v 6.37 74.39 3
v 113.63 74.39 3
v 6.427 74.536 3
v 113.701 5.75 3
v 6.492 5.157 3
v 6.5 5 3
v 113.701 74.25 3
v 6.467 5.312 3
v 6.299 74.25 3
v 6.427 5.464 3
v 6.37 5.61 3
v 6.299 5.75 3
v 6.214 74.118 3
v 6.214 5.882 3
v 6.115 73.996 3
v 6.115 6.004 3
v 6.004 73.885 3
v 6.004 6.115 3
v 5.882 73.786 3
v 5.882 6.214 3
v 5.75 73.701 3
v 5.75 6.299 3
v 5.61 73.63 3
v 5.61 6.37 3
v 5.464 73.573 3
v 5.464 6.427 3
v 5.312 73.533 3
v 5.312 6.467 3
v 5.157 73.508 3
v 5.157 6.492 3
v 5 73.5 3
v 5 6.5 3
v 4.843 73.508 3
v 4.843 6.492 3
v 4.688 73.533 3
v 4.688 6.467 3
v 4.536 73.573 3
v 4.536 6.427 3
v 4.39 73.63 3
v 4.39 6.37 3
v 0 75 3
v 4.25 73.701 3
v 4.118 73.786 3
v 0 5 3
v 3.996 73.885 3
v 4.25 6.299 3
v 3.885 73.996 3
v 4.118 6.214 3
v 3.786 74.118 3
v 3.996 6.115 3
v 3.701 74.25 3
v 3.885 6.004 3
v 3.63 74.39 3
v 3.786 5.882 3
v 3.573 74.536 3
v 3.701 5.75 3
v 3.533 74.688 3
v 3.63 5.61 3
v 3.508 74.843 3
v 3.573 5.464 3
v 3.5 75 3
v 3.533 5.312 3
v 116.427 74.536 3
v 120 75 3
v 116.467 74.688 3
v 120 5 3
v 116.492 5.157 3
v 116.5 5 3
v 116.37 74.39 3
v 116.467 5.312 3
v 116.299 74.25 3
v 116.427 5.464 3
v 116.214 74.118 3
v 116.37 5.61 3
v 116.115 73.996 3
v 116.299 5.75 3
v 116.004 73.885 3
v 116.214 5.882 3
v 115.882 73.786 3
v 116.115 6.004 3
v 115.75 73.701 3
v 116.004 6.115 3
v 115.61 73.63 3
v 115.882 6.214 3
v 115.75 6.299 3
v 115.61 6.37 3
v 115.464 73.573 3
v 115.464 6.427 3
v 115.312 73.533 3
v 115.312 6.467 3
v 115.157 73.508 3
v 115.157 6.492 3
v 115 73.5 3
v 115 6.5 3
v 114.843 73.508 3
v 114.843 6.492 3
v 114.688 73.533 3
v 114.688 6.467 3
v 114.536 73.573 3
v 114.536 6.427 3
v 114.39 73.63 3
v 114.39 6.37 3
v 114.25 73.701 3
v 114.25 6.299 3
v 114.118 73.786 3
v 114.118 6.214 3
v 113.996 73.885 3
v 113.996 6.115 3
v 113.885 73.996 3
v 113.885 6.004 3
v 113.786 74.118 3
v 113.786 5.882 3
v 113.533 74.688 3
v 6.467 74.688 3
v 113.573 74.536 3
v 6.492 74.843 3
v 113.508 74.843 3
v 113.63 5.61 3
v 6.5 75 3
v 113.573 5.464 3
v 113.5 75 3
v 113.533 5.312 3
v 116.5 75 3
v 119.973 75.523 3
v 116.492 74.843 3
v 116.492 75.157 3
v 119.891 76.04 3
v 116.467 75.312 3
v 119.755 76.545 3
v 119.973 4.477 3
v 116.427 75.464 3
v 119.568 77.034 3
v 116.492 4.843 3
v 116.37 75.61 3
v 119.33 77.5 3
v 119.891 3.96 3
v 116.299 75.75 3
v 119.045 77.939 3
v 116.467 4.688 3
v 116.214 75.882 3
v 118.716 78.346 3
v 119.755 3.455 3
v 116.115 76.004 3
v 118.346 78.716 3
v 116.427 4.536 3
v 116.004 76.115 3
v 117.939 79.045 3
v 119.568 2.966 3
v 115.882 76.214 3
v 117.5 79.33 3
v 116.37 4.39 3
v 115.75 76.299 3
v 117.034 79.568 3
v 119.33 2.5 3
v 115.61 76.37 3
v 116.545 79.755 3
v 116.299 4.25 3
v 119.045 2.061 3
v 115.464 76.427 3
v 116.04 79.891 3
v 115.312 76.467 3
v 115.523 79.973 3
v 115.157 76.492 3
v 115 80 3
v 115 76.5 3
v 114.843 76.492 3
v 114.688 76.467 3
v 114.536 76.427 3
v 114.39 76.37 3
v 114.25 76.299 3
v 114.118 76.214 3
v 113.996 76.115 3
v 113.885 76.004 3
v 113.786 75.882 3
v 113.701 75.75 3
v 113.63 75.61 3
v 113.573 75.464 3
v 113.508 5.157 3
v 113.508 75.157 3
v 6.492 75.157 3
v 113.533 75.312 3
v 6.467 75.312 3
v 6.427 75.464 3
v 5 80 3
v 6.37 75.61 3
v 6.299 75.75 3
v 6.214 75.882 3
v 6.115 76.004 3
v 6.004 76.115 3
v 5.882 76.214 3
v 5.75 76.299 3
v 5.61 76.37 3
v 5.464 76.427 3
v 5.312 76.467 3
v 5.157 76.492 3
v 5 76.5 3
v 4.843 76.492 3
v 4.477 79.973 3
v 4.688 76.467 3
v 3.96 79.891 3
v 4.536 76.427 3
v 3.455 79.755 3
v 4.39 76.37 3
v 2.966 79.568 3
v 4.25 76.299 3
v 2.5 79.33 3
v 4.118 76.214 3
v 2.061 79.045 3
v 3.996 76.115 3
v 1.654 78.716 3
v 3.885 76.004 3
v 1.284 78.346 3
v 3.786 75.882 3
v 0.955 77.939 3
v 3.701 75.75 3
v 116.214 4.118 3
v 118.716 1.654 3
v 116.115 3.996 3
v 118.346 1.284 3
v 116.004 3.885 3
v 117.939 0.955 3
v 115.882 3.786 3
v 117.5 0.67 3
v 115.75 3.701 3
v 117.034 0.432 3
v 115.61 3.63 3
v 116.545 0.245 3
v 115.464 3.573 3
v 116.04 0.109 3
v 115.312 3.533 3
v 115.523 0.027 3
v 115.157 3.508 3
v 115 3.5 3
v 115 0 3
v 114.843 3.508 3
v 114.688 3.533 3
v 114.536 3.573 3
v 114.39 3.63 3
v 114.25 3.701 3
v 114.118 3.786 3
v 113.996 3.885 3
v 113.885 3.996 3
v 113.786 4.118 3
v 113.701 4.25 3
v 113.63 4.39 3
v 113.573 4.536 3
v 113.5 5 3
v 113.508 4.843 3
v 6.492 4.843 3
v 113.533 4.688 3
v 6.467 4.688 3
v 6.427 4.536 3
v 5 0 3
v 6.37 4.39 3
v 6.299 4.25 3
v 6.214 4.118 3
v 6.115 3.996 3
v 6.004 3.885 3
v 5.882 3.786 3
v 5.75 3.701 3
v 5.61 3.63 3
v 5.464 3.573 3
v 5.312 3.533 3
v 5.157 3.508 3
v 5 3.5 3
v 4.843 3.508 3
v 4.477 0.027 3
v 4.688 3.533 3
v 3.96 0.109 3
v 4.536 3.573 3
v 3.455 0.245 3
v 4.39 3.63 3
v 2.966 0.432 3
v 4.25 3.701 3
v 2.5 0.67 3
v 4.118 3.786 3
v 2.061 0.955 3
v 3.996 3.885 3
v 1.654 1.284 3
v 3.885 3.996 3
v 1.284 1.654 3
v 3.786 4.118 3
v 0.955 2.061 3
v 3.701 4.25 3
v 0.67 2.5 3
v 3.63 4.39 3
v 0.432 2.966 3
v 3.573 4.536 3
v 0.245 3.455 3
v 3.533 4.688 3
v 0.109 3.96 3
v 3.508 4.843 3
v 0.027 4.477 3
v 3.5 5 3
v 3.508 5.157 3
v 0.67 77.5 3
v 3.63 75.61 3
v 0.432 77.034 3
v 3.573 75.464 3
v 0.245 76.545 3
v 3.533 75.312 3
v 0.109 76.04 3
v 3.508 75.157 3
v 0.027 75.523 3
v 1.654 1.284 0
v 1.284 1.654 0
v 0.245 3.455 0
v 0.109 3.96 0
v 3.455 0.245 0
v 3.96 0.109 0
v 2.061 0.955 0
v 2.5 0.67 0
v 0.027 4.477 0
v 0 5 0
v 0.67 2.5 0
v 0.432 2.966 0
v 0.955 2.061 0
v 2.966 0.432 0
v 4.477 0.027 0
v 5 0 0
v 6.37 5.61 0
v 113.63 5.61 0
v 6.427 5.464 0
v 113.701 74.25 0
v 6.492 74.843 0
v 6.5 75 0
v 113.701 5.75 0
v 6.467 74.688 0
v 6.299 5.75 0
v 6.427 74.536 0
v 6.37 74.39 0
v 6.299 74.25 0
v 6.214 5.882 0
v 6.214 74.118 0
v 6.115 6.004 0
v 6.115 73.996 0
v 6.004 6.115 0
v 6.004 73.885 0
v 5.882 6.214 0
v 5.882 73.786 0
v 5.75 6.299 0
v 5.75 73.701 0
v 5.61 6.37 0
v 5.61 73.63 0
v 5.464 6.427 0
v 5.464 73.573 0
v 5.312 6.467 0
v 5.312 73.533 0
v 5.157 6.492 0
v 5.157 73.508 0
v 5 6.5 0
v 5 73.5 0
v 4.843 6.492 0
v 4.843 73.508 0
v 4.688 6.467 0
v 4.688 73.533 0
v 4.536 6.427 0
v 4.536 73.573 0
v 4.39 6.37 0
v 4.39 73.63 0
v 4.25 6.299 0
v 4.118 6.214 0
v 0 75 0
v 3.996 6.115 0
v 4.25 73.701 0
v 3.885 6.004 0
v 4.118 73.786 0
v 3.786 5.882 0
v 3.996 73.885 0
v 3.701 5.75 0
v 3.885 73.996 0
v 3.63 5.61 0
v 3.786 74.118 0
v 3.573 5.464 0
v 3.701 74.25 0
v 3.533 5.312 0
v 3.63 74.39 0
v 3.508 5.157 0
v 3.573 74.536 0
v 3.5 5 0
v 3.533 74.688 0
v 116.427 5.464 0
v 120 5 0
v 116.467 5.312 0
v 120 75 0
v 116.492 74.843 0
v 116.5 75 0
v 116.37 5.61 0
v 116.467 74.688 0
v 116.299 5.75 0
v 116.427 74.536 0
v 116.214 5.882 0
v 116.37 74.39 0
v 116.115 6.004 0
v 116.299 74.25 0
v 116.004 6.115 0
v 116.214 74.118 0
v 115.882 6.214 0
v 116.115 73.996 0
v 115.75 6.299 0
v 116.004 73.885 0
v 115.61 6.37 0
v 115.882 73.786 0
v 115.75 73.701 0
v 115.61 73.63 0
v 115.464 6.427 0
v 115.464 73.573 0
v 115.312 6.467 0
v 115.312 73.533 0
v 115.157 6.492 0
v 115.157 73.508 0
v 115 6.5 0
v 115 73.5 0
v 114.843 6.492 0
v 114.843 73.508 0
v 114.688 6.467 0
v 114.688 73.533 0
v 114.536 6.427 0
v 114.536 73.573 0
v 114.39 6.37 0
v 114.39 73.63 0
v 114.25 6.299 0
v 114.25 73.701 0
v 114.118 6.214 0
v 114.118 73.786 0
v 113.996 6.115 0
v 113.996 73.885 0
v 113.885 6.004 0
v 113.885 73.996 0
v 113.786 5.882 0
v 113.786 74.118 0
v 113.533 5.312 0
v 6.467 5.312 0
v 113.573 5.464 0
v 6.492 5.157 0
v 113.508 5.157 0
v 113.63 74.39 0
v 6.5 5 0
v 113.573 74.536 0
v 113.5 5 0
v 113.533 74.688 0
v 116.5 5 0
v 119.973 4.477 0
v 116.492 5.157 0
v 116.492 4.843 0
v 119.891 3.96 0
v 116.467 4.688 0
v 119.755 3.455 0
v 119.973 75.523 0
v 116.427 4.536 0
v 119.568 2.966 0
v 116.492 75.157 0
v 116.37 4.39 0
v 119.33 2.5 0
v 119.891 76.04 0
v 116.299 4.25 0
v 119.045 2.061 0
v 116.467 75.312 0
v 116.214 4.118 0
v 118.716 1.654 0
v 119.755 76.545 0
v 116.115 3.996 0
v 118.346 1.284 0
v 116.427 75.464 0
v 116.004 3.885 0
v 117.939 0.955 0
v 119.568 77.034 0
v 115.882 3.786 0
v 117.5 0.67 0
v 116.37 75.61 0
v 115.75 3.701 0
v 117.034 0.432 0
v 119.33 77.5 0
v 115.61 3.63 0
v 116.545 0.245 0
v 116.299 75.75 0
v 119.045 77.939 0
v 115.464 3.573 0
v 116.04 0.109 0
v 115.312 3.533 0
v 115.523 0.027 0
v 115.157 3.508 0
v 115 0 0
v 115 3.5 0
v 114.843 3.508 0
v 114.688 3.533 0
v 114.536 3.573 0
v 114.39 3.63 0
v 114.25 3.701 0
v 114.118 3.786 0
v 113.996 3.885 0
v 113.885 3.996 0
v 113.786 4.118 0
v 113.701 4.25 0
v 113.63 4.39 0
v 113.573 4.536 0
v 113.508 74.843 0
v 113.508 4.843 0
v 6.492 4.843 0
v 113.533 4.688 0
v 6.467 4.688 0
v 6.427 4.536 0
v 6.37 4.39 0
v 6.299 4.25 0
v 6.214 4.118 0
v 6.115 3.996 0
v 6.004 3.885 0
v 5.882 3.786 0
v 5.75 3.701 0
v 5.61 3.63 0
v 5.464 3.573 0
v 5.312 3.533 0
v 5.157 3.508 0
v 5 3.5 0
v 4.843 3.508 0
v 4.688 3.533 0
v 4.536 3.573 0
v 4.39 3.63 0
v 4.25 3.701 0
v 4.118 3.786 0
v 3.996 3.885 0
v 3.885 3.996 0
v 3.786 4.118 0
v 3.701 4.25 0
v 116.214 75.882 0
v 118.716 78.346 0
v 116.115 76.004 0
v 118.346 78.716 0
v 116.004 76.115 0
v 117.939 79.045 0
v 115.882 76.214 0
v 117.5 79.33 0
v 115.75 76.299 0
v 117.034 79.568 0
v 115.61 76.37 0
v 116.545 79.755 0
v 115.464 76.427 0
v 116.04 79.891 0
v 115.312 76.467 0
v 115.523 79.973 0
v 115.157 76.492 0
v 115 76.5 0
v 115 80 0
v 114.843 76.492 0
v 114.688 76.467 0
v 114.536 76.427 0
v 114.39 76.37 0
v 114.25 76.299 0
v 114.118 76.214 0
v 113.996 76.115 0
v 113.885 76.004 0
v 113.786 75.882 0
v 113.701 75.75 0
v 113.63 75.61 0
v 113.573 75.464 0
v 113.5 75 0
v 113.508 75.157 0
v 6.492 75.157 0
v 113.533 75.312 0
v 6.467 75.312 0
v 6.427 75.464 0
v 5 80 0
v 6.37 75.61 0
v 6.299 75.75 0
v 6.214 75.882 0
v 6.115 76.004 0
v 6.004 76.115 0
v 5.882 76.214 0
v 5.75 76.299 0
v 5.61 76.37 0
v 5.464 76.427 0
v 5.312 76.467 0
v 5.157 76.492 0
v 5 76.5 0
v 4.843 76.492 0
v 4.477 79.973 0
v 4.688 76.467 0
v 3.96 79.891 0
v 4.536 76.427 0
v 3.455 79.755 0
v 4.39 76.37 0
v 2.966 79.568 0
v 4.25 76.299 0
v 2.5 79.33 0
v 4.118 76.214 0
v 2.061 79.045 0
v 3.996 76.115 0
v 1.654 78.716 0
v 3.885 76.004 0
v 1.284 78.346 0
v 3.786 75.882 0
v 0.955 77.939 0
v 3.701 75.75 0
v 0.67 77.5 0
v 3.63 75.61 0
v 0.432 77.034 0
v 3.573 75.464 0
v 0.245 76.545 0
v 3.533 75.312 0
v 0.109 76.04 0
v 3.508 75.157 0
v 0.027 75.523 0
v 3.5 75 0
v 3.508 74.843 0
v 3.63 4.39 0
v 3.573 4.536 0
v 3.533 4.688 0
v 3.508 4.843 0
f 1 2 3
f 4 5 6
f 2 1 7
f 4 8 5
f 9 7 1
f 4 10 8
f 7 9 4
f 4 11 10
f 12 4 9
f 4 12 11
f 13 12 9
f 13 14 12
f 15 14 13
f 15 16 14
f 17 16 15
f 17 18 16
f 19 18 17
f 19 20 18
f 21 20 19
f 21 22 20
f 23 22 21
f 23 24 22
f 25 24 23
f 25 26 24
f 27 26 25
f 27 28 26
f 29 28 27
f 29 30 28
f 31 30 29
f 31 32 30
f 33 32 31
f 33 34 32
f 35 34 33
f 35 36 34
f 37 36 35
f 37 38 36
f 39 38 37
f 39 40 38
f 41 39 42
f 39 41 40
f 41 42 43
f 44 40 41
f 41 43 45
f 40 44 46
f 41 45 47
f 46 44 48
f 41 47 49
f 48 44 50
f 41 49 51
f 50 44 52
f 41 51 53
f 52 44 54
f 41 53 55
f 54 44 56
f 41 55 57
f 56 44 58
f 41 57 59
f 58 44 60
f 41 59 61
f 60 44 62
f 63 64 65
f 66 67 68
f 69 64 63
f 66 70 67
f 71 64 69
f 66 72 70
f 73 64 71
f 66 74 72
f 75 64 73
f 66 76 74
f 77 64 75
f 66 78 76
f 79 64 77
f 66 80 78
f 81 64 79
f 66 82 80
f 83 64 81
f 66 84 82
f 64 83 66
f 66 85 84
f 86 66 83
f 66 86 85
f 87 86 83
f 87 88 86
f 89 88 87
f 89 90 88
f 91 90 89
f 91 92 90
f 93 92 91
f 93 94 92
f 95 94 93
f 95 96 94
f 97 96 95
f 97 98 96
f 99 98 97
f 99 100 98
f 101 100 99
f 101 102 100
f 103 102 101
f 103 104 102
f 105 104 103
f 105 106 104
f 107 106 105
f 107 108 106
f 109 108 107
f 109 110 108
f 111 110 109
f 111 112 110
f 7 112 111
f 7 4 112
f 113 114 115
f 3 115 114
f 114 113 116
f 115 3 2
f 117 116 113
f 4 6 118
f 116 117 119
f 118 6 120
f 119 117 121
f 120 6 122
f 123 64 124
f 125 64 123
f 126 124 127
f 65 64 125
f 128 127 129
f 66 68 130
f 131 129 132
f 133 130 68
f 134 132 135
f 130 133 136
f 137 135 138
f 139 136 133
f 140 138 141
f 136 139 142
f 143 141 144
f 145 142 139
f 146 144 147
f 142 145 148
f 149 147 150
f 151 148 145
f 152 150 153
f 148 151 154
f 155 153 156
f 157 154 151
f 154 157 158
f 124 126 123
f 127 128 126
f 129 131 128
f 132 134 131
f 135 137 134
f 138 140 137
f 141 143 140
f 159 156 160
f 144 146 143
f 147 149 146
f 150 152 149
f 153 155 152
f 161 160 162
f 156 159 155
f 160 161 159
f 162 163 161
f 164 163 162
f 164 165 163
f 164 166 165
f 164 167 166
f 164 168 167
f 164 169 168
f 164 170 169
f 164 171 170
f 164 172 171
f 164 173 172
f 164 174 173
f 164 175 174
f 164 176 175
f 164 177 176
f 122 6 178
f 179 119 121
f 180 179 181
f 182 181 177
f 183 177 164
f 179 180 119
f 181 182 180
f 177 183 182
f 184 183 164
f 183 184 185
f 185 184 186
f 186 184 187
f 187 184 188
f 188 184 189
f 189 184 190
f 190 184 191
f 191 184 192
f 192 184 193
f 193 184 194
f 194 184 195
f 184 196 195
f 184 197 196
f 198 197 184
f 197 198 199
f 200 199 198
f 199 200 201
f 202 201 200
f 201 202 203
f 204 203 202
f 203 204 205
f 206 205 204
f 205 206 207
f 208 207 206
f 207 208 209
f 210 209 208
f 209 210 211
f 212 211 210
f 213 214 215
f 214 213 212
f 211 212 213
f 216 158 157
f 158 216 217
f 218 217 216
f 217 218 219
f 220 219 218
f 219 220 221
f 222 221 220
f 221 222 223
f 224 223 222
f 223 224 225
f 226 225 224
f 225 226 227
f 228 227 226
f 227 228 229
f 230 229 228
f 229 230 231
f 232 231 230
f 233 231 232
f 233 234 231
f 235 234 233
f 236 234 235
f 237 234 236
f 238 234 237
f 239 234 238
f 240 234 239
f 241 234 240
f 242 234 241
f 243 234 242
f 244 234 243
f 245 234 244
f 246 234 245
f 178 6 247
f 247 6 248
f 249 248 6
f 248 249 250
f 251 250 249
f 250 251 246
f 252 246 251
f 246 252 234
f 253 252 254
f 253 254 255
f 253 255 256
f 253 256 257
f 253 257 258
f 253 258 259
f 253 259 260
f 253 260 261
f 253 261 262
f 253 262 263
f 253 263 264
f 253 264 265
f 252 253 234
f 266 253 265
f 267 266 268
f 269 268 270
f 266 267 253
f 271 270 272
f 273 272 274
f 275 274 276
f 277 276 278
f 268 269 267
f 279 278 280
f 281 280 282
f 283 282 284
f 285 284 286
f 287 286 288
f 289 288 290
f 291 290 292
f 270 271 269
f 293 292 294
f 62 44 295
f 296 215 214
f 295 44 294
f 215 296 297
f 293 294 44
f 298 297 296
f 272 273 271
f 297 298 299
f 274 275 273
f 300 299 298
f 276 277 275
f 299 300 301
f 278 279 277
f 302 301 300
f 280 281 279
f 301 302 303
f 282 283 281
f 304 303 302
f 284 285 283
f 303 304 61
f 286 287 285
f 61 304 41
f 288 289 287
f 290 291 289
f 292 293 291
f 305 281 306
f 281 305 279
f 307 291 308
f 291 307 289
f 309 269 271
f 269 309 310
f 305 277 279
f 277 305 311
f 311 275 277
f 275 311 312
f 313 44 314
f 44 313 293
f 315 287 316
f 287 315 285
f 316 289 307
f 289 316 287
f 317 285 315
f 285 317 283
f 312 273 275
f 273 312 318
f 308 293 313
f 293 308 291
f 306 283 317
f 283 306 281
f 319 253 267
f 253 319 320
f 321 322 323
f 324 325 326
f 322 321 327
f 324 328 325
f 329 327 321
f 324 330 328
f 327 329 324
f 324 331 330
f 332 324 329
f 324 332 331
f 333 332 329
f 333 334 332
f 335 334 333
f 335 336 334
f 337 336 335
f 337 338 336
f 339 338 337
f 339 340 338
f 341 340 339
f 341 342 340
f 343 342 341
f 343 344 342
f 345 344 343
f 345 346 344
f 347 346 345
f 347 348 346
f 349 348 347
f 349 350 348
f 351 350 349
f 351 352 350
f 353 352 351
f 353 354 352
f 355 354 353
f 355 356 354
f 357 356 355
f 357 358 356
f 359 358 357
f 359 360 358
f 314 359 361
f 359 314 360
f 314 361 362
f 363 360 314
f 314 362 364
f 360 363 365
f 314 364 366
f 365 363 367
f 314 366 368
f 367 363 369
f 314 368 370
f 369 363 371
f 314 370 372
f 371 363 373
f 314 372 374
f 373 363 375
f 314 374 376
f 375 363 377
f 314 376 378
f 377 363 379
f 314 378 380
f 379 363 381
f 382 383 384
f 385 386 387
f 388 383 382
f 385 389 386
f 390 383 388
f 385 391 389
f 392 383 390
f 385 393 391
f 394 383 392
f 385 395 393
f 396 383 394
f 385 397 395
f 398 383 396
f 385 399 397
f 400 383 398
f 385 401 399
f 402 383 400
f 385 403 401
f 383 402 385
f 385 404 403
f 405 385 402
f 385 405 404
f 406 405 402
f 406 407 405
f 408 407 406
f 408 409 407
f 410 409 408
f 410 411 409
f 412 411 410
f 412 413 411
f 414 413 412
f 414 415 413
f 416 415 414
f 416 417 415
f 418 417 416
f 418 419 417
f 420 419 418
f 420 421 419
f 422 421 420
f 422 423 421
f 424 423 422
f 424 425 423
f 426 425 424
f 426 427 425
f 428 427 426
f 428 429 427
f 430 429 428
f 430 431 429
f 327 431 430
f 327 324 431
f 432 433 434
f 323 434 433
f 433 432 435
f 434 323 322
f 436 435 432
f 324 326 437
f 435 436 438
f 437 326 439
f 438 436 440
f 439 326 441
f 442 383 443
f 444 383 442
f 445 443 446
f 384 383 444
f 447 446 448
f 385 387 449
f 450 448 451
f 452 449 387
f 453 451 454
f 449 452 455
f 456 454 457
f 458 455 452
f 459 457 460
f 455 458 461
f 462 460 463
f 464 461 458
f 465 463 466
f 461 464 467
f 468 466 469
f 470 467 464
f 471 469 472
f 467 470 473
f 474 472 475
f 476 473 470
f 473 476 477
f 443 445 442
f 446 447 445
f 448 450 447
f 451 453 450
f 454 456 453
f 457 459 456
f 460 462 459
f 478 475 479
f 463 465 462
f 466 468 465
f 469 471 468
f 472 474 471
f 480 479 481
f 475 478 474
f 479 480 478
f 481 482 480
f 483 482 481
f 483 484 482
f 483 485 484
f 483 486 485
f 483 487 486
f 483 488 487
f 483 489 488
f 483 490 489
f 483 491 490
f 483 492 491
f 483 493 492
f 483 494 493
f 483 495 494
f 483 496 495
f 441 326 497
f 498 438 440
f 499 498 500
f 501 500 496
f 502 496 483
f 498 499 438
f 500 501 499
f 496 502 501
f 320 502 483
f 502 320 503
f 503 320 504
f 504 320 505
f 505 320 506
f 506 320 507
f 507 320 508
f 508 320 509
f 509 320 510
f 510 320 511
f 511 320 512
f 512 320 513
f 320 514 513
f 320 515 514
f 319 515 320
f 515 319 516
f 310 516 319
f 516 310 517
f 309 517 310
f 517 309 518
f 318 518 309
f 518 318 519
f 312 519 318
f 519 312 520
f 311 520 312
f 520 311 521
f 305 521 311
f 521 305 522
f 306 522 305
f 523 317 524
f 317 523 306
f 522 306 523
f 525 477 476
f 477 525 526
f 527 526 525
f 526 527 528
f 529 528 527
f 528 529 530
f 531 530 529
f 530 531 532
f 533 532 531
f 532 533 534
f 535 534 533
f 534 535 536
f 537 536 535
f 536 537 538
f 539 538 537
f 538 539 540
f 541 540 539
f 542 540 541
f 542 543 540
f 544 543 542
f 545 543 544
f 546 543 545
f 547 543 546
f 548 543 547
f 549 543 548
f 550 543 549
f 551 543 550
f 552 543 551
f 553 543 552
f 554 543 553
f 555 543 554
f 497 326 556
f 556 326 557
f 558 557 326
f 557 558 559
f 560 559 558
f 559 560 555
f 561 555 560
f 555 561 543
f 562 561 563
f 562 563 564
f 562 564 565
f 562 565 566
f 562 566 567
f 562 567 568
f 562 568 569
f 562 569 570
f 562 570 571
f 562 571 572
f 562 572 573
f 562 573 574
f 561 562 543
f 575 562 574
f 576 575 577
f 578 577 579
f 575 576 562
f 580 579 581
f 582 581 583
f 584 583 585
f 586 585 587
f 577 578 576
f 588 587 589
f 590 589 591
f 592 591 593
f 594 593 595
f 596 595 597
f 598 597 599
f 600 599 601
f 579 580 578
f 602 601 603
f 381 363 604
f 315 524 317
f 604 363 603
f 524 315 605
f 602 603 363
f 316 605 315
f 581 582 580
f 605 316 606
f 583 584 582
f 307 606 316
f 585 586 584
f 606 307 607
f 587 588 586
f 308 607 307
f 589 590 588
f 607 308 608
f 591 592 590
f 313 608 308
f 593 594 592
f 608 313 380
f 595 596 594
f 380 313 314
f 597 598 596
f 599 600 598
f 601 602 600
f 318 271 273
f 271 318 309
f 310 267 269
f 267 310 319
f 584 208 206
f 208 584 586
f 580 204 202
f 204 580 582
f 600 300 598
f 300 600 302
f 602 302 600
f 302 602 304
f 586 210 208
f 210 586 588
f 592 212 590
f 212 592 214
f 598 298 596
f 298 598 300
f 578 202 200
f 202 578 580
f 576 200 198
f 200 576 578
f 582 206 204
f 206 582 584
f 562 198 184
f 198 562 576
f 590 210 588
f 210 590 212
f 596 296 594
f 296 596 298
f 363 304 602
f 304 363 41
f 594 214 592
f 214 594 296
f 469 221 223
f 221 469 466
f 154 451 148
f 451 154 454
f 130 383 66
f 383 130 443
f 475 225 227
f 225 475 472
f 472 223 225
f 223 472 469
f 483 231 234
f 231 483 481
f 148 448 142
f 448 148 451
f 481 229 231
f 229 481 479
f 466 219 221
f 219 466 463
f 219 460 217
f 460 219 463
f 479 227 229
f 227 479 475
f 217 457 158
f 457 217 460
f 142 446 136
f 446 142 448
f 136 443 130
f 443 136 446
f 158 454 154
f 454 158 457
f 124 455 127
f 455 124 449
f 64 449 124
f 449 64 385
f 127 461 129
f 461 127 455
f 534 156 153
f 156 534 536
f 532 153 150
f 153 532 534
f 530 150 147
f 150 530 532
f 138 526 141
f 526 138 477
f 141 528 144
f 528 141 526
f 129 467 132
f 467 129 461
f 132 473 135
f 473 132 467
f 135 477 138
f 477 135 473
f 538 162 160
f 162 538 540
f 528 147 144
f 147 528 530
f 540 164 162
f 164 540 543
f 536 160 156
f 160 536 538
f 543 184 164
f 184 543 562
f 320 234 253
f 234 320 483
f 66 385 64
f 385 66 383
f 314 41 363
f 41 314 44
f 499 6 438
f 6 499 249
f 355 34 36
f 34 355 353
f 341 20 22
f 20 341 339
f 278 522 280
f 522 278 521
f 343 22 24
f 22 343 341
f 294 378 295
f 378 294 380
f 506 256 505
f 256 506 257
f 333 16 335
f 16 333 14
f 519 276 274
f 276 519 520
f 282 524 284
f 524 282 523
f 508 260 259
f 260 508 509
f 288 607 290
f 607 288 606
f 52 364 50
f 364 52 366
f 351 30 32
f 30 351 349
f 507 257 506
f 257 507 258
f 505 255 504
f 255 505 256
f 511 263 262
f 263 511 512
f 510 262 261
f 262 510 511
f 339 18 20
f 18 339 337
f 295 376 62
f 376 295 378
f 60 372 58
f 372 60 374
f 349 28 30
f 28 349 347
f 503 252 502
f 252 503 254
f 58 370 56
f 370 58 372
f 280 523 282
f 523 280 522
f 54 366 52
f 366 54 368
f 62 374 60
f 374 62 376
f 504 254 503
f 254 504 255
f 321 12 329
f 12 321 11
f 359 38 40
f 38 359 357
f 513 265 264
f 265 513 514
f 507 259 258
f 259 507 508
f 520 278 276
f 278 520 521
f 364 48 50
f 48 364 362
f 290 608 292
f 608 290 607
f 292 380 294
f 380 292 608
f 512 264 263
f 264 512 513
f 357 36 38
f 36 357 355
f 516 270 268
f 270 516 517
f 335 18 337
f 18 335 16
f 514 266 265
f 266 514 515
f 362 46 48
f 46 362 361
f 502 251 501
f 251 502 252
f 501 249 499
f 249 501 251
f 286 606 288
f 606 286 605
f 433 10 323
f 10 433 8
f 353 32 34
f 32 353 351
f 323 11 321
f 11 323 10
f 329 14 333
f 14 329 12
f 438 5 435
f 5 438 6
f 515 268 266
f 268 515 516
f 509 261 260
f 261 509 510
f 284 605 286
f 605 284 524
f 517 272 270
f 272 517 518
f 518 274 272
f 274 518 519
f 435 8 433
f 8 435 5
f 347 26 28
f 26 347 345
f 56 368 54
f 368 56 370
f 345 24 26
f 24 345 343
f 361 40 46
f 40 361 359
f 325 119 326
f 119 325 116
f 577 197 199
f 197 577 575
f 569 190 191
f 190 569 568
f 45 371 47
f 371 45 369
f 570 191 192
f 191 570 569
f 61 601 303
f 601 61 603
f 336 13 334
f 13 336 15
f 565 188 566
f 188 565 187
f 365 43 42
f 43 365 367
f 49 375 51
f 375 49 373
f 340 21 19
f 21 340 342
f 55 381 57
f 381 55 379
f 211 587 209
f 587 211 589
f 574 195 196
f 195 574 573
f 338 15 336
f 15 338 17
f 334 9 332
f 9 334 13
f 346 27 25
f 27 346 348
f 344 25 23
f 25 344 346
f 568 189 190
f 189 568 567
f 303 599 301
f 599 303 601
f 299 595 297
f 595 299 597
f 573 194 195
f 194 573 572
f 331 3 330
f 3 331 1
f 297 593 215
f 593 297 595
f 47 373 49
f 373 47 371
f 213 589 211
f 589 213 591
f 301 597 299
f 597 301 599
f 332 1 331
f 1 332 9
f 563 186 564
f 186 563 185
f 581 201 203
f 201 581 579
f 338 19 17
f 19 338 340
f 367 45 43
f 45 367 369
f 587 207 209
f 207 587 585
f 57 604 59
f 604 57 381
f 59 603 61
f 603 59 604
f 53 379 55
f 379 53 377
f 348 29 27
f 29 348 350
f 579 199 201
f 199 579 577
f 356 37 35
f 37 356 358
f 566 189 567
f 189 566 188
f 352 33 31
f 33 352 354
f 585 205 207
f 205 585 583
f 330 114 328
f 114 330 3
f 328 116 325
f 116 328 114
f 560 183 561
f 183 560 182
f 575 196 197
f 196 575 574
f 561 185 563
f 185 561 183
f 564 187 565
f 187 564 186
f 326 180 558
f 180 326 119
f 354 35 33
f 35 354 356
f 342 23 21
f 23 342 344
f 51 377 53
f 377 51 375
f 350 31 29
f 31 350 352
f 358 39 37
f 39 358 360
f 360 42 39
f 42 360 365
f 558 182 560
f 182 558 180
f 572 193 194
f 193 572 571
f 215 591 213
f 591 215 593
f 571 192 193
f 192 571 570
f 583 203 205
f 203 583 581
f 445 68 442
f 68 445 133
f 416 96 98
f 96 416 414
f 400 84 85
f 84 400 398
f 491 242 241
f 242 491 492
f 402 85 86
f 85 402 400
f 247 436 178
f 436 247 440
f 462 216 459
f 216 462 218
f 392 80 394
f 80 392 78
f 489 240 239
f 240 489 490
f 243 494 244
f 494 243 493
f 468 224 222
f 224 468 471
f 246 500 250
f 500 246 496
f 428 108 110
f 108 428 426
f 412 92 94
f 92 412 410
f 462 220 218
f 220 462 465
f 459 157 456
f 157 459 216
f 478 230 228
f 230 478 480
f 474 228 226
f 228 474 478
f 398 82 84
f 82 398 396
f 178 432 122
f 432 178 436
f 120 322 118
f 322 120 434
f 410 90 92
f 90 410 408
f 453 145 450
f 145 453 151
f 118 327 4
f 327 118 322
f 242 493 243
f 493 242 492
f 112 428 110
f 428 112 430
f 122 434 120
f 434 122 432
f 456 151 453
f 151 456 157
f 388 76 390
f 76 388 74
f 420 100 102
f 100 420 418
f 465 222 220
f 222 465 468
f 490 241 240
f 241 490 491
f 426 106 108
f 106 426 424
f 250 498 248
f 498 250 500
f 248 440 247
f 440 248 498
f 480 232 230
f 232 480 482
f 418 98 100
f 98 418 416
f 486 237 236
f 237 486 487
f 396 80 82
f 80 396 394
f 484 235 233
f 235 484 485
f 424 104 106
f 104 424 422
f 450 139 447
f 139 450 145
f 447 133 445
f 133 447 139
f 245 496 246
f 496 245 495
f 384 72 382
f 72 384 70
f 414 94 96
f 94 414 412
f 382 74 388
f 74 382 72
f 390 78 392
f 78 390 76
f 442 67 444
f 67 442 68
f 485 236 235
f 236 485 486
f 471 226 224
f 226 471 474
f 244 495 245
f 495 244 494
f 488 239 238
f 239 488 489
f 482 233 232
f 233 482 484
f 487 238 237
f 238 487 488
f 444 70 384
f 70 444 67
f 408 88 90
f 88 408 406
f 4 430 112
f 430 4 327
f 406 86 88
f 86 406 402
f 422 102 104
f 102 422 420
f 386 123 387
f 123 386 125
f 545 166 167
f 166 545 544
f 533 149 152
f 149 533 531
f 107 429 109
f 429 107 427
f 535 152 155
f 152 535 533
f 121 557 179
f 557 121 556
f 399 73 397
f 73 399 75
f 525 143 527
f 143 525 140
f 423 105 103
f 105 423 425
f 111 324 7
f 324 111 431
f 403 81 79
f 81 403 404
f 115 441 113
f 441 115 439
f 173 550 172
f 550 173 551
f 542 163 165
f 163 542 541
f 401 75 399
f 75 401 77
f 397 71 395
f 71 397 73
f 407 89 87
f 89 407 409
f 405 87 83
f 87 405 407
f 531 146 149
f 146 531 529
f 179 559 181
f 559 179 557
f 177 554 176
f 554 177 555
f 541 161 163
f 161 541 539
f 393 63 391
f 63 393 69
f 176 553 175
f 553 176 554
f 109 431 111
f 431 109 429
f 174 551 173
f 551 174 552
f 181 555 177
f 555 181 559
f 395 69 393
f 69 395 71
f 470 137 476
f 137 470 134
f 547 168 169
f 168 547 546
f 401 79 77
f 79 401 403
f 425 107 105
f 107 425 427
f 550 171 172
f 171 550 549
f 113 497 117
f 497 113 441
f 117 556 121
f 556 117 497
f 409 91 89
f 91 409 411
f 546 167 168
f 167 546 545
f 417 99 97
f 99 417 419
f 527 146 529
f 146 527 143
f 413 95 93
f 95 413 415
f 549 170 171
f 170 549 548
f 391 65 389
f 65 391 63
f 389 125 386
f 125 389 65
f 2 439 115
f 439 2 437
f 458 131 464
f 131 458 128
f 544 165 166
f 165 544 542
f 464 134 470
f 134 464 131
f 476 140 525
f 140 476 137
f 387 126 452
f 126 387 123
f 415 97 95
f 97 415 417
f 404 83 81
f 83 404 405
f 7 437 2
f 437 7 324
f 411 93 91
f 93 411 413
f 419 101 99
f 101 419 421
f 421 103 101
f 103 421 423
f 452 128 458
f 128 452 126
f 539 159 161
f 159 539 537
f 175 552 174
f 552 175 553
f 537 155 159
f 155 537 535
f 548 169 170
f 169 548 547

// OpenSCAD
use <MCAD/boxes.scad>
$fn=60;
// Choose Part
part = "2"; // [1:Case Only,2:Cover Plate Only,3:Both]

// Width of the case
width = 120;

// Depth of the case
depth = 80;

// Height of the case
height = 40;

// Material thickness of the case and plates
material_thickness = 3;

// Corner radius of rounded corners
corner_radius = 5;

// Hole offset
hole_offset = 5; //[1:14]

// Hole diameter
hole_diameter = 3;

print_part();

module print_part() {
	if (part == "1") {
		base();
	} else if (part == "2") {
		plate();
	} else if (part == "3") {
		both();
	} else {
		both();
	}
}

module both(){
	base();
	translate([0,0,height])
		plate();
}

module base(){
	// All dimensions in mm
	x = width;
	y = depth;
	z = height;

	union(){
		for (i=[ [hole_offset,hole_offset, 0],
				[hole_offset,y-hole_offset, 0],
				[x-hole_offset,hole_offset, 0],
				[x-hole_offset,y-hole_offset, 0] ])
			{
			translate(i){
				linear_extrude(height=z){
					difference(){
						circle(r=(hole_diameter));
						circle(r=(hole_diameter/2));
					}
				}
			}
		}
		difference(){
			translate([x/2, y/2, height/2]){
			  roundedBox([x, y, height], 5, true);
			}
			translate([material_thickness, material_thickness, 0]) {
				linear_extrude(height=z)
				square(size = [x-(material_thickness*2), y-(material_thickness*2)], center = false);
		   	}
		}
	}
}


module plate(){
	// All dimensions in mm
	x = width;
	y = depth;
	z = material_thickness;

	difference() {
		// create the base
		translate([x/2, y/2, z/2]){
		  roundedBox([x, y, z], corner_radius, true);
		}
		// Create 4 holes
		for (i = [ [hole_offset,hole_offset, -10],
			[hole_offset,y-hole_offset, -10],
			[x-hole_offset,hole_offset, -10],
			[x-hole_offset,y-hole_offset, -10] ])
		{
			translate(i) {
				linear_extrude(height = z + 10)
				circle(r=(hole_diameter/2));
			}
		}
	}
}
